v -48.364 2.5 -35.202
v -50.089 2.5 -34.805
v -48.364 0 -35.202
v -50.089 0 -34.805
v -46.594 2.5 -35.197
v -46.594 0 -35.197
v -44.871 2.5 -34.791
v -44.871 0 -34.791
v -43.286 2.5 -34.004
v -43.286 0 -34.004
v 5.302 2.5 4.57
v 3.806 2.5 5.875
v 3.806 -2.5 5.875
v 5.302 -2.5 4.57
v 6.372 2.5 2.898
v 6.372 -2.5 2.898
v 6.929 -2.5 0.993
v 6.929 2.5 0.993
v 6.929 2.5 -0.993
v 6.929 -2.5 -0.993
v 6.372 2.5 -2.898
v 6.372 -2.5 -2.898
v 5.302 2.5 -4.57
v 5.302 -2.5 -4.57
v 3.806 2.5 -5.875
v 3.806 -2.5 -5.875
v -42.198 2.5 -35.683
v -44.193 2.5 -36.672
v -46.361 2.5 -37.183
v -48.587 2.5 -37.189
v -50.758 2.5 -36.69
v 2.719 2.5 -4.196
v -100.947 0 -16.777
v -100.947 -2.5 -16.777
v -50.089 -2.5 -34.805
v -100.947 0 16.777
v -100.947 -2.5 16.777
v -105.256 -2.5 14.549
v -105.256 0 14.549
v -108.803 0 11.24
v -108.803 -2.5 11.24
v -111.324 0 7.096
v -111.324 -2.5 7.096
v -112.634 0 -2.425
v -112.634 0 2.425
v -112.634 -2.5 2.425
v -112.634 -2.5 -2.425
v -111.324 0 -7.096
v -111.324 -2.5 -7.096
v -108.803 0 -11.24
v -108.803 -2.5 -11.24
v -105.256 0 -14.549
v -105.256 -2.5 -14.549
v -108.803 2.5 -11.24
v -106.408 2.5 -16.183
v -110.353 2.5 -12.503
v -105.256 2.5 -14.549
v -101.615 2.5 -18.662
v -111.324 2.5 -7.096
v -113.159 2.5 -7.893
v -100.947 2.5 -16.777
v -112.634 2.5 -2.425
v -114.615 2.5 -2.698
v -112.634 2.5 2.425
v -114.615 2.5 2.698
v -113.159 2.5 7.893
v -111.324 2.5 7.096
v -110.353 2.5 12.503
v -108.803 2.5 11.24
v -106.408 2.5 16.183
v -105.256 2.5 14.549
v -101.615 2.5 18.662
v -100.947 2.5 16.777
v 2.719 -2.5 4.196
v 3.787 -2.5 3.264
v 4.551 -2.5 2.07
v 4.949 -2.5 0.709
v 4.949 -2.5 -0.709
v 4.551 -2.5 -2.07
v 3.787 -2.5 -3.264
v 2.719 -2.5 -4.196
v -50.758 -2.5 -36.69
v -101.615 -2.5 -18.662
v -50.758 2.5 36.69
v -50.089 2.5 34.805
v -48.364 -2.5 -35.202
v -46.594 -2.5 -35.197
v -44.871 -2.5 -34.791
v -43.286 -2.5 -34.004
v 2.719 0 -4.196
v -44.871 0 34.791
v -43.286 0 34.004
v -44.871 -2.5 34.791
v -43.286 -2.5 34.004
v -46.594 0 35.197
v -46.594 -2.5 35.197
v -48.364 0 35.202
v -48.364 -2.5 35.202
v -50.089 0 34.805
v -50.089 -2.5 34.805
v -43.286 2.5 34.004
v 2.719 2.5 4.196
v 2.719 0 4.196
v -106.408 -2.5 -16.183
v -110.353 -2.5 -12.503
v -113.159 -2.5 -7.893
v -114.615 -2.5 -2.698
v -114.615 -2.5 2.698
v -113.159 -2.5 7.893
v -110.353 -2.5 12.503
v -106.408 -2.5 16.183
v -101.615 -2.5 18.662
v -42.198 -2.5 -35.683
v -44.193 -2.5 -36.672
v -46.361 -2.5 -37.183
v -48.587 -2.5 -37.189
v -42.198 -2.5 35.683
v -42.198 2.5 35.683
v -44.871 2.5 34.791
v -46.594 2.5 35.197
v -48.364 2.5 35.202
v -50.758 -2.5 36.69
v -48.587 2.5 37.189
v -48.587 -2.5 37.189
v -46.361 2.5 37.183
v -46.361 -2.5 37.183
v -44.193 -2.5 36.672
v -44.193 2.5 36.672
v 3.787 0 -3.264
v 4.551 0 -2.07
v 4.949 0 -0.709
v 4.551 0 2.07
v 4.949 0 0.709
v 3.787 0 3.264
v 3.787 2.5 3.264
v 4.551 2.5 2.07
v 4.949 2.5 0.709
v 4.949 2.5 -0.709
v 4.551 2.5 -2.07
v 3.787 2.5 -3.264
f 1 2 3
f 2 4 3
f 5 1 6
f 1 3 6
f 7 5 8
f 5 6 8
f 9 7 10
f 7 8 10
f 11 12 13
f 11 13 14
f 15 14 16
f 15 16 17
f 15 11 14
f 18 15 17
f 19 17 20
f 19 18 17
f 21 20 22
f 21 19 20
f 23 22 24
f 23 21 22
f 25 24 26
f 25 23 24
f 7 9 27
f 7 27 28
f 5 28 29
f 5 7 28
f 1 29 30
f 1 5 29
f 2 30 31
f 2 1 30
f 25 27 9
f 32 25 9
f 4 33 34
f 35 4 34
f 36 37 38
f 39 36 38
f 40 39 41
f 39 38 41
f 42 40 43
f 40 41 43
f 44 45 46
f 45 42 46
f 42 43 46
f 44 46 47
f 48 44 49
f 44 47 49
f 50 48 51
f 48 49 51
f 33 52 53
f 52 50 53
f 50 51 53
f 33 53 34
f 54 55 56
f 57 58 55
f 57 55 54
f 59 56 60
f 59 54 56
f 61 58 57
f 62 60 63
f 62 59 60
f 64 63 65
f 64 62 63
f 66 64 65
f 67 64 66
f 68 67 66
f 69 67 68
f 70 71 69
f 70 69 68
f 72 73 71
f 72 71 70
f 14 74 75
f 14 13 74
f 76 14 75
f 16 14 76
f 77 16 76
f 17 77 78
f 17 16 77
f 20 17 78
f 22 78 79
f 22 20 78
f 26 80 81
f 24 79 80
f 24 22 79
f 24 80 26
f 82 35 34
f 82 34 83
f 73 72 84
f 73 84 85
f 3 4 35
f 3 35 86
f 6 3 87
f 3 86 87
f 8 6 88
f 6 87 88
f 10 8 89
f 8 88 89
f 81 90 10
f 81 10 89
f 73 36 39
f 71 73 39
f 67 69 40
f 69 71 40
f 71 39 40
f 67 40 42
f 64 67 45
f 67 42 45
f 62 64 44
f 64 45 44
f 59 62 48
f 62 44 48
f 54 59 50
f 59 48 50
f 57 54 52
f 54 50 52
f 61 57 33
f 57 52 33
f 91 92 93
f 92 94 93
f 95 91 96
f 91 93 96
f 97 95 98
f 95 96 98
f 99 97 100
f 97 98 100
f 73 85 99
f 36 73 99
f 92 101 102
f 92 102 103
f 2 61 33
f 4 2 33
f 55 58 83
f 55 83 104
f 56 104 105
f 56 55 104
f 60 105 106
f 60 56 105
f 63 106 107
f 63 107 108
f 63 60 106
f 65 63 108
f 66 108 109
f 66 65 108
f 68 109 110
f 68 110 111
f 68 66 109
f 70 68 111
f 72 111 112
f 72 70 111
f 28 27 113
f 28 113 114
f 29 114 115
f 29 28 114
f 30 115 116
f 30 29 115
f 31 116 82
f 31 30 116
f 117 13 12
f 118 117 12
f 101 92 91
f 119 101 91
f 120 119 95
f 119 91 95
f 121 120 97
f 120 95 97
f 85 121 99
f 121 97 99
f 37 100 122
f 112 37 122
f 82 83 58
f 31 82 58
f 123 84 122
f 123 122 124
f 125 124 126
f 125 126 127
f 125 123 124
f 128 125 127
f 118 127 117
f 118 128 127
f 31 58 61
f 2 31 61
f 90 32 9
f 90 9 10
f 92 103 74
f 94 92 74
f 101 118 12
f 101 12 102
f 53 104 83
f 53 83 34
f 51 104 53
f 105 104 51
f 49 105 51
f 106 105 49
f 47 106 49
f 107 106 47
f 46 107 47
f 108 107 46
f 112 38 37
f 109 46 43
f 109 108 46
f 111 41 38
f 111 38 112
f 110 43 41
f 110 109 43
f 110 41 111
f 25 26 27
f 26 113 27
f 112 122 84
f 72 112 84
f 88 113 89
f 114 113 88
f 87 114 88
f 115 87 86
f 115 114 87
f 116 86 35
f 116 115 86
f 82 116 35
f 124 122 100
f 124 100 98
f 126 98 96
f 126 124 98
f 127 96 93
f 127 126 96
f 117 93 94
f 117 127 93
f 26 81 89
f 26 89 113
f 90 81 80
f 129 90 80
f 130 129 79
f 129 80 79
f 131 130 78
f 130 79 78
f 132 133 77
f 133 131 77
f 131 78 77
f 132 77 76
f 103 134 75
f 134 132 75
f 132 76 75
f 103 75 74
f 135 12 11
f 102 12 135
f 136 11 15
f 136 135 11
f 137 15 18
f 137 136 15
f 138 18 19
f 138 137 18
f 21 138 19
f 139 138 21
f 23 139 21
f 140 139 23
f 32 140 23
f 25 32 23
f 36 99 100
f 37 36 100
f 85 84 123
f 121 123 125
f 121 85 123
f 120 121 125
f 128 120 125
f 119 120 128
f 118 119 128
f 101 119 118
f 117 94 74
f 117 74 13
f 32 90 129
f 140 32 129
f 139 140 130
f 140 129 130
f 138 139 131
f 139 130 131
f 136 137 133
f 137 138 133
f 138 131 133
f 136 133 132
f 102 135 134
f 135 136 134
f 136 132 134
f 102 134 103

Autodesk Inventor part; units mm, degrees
ref_plane "YZ Plane" through (0, 0, 0) normal (1, 0, 0) x (0, 1, 0)
ref_plane "XZ Plane" through (0, 0, 0) normal (0, 1, 0) x (-1, 0, 0)
ref_plane "XY Plane" through (0, 0, 0) normal (0, 0, 1) x (1, 0, 0)
sketch "Sketch1" plane through (0, 0, 0) normal (0, 1, 0) x (-1, 0, 0)
  arc A0 (-3.2626, 5.0354) -> (-3.2626, -5.0354) centre (0, 0) ccw
  line L0 (0, 0) -> (47.5, 0) construction
  line L1 (47.5, 0) -> (47.5, -27.5) construction
  line L2 (47.5, 0) -> (47.5, 27.5) construction
  arc A1 (42.742, -34.8433) -> (50.4234, -35.7472) centre (47.5, -27.5) ccw
  arc A2 (50.4234, 35.7472) -> (42.742, 34.8433) centre (47.5, 27.5) ccw
  line L3 (47.5, 0) -> (95, 0) construction
  arc A3 (101.2811, -17.7197) -> (101.2811, 17.7197) centre (95, 0) ccw
  line L4 (101.2811, 17.7197) -> (50.4234, 35.7472)
  line L5 (101.2811, -17.7197) -> (50.4234, -35.7472)
  line L6 (42.742, -34.8433) -> (-3.2626, -5.0354)
  line L7 (42.742, 34.8433) -> (-3.2626, 5.0354)
  dimension "d0" = 12
  dimension "d1" = 47.5
  dimension "d2" = 27.5
  dimension "d3" = 27.5
  dimension "d4" = 17.5
  dimension "d5" = 17.5
  dimension "d6" = 47.5
  dimension "d7" = 37.6
sketch "Sketch2" plane through (0, 0, 0) normal (0, 0, 1) x (1, 0, 0)
  line L0 (0, 0) -> (6, 0)
  line L1 (5, 2.5) -> (5, -2.5)
  line L2 (5, -2.5) -> (7, -2.5)
  line L3 (7, -2.5) -> (7, 2.5)
  line L4 (7, 2.5) -> (5, 2.5)
  line L5 (5, 2.5) -> (7, -2.5) construction
  line L6 (5, -2.5) -> (7, 2.5) construction
  dimension "d8" = 6
  dimension "d9" = 2
  dimension "d10" = 5
sweep "Sweep1" add profiles "Sketch2" path "Sketch1"
properties part number "GT2_TimingBelt Base" material "Rubber"
